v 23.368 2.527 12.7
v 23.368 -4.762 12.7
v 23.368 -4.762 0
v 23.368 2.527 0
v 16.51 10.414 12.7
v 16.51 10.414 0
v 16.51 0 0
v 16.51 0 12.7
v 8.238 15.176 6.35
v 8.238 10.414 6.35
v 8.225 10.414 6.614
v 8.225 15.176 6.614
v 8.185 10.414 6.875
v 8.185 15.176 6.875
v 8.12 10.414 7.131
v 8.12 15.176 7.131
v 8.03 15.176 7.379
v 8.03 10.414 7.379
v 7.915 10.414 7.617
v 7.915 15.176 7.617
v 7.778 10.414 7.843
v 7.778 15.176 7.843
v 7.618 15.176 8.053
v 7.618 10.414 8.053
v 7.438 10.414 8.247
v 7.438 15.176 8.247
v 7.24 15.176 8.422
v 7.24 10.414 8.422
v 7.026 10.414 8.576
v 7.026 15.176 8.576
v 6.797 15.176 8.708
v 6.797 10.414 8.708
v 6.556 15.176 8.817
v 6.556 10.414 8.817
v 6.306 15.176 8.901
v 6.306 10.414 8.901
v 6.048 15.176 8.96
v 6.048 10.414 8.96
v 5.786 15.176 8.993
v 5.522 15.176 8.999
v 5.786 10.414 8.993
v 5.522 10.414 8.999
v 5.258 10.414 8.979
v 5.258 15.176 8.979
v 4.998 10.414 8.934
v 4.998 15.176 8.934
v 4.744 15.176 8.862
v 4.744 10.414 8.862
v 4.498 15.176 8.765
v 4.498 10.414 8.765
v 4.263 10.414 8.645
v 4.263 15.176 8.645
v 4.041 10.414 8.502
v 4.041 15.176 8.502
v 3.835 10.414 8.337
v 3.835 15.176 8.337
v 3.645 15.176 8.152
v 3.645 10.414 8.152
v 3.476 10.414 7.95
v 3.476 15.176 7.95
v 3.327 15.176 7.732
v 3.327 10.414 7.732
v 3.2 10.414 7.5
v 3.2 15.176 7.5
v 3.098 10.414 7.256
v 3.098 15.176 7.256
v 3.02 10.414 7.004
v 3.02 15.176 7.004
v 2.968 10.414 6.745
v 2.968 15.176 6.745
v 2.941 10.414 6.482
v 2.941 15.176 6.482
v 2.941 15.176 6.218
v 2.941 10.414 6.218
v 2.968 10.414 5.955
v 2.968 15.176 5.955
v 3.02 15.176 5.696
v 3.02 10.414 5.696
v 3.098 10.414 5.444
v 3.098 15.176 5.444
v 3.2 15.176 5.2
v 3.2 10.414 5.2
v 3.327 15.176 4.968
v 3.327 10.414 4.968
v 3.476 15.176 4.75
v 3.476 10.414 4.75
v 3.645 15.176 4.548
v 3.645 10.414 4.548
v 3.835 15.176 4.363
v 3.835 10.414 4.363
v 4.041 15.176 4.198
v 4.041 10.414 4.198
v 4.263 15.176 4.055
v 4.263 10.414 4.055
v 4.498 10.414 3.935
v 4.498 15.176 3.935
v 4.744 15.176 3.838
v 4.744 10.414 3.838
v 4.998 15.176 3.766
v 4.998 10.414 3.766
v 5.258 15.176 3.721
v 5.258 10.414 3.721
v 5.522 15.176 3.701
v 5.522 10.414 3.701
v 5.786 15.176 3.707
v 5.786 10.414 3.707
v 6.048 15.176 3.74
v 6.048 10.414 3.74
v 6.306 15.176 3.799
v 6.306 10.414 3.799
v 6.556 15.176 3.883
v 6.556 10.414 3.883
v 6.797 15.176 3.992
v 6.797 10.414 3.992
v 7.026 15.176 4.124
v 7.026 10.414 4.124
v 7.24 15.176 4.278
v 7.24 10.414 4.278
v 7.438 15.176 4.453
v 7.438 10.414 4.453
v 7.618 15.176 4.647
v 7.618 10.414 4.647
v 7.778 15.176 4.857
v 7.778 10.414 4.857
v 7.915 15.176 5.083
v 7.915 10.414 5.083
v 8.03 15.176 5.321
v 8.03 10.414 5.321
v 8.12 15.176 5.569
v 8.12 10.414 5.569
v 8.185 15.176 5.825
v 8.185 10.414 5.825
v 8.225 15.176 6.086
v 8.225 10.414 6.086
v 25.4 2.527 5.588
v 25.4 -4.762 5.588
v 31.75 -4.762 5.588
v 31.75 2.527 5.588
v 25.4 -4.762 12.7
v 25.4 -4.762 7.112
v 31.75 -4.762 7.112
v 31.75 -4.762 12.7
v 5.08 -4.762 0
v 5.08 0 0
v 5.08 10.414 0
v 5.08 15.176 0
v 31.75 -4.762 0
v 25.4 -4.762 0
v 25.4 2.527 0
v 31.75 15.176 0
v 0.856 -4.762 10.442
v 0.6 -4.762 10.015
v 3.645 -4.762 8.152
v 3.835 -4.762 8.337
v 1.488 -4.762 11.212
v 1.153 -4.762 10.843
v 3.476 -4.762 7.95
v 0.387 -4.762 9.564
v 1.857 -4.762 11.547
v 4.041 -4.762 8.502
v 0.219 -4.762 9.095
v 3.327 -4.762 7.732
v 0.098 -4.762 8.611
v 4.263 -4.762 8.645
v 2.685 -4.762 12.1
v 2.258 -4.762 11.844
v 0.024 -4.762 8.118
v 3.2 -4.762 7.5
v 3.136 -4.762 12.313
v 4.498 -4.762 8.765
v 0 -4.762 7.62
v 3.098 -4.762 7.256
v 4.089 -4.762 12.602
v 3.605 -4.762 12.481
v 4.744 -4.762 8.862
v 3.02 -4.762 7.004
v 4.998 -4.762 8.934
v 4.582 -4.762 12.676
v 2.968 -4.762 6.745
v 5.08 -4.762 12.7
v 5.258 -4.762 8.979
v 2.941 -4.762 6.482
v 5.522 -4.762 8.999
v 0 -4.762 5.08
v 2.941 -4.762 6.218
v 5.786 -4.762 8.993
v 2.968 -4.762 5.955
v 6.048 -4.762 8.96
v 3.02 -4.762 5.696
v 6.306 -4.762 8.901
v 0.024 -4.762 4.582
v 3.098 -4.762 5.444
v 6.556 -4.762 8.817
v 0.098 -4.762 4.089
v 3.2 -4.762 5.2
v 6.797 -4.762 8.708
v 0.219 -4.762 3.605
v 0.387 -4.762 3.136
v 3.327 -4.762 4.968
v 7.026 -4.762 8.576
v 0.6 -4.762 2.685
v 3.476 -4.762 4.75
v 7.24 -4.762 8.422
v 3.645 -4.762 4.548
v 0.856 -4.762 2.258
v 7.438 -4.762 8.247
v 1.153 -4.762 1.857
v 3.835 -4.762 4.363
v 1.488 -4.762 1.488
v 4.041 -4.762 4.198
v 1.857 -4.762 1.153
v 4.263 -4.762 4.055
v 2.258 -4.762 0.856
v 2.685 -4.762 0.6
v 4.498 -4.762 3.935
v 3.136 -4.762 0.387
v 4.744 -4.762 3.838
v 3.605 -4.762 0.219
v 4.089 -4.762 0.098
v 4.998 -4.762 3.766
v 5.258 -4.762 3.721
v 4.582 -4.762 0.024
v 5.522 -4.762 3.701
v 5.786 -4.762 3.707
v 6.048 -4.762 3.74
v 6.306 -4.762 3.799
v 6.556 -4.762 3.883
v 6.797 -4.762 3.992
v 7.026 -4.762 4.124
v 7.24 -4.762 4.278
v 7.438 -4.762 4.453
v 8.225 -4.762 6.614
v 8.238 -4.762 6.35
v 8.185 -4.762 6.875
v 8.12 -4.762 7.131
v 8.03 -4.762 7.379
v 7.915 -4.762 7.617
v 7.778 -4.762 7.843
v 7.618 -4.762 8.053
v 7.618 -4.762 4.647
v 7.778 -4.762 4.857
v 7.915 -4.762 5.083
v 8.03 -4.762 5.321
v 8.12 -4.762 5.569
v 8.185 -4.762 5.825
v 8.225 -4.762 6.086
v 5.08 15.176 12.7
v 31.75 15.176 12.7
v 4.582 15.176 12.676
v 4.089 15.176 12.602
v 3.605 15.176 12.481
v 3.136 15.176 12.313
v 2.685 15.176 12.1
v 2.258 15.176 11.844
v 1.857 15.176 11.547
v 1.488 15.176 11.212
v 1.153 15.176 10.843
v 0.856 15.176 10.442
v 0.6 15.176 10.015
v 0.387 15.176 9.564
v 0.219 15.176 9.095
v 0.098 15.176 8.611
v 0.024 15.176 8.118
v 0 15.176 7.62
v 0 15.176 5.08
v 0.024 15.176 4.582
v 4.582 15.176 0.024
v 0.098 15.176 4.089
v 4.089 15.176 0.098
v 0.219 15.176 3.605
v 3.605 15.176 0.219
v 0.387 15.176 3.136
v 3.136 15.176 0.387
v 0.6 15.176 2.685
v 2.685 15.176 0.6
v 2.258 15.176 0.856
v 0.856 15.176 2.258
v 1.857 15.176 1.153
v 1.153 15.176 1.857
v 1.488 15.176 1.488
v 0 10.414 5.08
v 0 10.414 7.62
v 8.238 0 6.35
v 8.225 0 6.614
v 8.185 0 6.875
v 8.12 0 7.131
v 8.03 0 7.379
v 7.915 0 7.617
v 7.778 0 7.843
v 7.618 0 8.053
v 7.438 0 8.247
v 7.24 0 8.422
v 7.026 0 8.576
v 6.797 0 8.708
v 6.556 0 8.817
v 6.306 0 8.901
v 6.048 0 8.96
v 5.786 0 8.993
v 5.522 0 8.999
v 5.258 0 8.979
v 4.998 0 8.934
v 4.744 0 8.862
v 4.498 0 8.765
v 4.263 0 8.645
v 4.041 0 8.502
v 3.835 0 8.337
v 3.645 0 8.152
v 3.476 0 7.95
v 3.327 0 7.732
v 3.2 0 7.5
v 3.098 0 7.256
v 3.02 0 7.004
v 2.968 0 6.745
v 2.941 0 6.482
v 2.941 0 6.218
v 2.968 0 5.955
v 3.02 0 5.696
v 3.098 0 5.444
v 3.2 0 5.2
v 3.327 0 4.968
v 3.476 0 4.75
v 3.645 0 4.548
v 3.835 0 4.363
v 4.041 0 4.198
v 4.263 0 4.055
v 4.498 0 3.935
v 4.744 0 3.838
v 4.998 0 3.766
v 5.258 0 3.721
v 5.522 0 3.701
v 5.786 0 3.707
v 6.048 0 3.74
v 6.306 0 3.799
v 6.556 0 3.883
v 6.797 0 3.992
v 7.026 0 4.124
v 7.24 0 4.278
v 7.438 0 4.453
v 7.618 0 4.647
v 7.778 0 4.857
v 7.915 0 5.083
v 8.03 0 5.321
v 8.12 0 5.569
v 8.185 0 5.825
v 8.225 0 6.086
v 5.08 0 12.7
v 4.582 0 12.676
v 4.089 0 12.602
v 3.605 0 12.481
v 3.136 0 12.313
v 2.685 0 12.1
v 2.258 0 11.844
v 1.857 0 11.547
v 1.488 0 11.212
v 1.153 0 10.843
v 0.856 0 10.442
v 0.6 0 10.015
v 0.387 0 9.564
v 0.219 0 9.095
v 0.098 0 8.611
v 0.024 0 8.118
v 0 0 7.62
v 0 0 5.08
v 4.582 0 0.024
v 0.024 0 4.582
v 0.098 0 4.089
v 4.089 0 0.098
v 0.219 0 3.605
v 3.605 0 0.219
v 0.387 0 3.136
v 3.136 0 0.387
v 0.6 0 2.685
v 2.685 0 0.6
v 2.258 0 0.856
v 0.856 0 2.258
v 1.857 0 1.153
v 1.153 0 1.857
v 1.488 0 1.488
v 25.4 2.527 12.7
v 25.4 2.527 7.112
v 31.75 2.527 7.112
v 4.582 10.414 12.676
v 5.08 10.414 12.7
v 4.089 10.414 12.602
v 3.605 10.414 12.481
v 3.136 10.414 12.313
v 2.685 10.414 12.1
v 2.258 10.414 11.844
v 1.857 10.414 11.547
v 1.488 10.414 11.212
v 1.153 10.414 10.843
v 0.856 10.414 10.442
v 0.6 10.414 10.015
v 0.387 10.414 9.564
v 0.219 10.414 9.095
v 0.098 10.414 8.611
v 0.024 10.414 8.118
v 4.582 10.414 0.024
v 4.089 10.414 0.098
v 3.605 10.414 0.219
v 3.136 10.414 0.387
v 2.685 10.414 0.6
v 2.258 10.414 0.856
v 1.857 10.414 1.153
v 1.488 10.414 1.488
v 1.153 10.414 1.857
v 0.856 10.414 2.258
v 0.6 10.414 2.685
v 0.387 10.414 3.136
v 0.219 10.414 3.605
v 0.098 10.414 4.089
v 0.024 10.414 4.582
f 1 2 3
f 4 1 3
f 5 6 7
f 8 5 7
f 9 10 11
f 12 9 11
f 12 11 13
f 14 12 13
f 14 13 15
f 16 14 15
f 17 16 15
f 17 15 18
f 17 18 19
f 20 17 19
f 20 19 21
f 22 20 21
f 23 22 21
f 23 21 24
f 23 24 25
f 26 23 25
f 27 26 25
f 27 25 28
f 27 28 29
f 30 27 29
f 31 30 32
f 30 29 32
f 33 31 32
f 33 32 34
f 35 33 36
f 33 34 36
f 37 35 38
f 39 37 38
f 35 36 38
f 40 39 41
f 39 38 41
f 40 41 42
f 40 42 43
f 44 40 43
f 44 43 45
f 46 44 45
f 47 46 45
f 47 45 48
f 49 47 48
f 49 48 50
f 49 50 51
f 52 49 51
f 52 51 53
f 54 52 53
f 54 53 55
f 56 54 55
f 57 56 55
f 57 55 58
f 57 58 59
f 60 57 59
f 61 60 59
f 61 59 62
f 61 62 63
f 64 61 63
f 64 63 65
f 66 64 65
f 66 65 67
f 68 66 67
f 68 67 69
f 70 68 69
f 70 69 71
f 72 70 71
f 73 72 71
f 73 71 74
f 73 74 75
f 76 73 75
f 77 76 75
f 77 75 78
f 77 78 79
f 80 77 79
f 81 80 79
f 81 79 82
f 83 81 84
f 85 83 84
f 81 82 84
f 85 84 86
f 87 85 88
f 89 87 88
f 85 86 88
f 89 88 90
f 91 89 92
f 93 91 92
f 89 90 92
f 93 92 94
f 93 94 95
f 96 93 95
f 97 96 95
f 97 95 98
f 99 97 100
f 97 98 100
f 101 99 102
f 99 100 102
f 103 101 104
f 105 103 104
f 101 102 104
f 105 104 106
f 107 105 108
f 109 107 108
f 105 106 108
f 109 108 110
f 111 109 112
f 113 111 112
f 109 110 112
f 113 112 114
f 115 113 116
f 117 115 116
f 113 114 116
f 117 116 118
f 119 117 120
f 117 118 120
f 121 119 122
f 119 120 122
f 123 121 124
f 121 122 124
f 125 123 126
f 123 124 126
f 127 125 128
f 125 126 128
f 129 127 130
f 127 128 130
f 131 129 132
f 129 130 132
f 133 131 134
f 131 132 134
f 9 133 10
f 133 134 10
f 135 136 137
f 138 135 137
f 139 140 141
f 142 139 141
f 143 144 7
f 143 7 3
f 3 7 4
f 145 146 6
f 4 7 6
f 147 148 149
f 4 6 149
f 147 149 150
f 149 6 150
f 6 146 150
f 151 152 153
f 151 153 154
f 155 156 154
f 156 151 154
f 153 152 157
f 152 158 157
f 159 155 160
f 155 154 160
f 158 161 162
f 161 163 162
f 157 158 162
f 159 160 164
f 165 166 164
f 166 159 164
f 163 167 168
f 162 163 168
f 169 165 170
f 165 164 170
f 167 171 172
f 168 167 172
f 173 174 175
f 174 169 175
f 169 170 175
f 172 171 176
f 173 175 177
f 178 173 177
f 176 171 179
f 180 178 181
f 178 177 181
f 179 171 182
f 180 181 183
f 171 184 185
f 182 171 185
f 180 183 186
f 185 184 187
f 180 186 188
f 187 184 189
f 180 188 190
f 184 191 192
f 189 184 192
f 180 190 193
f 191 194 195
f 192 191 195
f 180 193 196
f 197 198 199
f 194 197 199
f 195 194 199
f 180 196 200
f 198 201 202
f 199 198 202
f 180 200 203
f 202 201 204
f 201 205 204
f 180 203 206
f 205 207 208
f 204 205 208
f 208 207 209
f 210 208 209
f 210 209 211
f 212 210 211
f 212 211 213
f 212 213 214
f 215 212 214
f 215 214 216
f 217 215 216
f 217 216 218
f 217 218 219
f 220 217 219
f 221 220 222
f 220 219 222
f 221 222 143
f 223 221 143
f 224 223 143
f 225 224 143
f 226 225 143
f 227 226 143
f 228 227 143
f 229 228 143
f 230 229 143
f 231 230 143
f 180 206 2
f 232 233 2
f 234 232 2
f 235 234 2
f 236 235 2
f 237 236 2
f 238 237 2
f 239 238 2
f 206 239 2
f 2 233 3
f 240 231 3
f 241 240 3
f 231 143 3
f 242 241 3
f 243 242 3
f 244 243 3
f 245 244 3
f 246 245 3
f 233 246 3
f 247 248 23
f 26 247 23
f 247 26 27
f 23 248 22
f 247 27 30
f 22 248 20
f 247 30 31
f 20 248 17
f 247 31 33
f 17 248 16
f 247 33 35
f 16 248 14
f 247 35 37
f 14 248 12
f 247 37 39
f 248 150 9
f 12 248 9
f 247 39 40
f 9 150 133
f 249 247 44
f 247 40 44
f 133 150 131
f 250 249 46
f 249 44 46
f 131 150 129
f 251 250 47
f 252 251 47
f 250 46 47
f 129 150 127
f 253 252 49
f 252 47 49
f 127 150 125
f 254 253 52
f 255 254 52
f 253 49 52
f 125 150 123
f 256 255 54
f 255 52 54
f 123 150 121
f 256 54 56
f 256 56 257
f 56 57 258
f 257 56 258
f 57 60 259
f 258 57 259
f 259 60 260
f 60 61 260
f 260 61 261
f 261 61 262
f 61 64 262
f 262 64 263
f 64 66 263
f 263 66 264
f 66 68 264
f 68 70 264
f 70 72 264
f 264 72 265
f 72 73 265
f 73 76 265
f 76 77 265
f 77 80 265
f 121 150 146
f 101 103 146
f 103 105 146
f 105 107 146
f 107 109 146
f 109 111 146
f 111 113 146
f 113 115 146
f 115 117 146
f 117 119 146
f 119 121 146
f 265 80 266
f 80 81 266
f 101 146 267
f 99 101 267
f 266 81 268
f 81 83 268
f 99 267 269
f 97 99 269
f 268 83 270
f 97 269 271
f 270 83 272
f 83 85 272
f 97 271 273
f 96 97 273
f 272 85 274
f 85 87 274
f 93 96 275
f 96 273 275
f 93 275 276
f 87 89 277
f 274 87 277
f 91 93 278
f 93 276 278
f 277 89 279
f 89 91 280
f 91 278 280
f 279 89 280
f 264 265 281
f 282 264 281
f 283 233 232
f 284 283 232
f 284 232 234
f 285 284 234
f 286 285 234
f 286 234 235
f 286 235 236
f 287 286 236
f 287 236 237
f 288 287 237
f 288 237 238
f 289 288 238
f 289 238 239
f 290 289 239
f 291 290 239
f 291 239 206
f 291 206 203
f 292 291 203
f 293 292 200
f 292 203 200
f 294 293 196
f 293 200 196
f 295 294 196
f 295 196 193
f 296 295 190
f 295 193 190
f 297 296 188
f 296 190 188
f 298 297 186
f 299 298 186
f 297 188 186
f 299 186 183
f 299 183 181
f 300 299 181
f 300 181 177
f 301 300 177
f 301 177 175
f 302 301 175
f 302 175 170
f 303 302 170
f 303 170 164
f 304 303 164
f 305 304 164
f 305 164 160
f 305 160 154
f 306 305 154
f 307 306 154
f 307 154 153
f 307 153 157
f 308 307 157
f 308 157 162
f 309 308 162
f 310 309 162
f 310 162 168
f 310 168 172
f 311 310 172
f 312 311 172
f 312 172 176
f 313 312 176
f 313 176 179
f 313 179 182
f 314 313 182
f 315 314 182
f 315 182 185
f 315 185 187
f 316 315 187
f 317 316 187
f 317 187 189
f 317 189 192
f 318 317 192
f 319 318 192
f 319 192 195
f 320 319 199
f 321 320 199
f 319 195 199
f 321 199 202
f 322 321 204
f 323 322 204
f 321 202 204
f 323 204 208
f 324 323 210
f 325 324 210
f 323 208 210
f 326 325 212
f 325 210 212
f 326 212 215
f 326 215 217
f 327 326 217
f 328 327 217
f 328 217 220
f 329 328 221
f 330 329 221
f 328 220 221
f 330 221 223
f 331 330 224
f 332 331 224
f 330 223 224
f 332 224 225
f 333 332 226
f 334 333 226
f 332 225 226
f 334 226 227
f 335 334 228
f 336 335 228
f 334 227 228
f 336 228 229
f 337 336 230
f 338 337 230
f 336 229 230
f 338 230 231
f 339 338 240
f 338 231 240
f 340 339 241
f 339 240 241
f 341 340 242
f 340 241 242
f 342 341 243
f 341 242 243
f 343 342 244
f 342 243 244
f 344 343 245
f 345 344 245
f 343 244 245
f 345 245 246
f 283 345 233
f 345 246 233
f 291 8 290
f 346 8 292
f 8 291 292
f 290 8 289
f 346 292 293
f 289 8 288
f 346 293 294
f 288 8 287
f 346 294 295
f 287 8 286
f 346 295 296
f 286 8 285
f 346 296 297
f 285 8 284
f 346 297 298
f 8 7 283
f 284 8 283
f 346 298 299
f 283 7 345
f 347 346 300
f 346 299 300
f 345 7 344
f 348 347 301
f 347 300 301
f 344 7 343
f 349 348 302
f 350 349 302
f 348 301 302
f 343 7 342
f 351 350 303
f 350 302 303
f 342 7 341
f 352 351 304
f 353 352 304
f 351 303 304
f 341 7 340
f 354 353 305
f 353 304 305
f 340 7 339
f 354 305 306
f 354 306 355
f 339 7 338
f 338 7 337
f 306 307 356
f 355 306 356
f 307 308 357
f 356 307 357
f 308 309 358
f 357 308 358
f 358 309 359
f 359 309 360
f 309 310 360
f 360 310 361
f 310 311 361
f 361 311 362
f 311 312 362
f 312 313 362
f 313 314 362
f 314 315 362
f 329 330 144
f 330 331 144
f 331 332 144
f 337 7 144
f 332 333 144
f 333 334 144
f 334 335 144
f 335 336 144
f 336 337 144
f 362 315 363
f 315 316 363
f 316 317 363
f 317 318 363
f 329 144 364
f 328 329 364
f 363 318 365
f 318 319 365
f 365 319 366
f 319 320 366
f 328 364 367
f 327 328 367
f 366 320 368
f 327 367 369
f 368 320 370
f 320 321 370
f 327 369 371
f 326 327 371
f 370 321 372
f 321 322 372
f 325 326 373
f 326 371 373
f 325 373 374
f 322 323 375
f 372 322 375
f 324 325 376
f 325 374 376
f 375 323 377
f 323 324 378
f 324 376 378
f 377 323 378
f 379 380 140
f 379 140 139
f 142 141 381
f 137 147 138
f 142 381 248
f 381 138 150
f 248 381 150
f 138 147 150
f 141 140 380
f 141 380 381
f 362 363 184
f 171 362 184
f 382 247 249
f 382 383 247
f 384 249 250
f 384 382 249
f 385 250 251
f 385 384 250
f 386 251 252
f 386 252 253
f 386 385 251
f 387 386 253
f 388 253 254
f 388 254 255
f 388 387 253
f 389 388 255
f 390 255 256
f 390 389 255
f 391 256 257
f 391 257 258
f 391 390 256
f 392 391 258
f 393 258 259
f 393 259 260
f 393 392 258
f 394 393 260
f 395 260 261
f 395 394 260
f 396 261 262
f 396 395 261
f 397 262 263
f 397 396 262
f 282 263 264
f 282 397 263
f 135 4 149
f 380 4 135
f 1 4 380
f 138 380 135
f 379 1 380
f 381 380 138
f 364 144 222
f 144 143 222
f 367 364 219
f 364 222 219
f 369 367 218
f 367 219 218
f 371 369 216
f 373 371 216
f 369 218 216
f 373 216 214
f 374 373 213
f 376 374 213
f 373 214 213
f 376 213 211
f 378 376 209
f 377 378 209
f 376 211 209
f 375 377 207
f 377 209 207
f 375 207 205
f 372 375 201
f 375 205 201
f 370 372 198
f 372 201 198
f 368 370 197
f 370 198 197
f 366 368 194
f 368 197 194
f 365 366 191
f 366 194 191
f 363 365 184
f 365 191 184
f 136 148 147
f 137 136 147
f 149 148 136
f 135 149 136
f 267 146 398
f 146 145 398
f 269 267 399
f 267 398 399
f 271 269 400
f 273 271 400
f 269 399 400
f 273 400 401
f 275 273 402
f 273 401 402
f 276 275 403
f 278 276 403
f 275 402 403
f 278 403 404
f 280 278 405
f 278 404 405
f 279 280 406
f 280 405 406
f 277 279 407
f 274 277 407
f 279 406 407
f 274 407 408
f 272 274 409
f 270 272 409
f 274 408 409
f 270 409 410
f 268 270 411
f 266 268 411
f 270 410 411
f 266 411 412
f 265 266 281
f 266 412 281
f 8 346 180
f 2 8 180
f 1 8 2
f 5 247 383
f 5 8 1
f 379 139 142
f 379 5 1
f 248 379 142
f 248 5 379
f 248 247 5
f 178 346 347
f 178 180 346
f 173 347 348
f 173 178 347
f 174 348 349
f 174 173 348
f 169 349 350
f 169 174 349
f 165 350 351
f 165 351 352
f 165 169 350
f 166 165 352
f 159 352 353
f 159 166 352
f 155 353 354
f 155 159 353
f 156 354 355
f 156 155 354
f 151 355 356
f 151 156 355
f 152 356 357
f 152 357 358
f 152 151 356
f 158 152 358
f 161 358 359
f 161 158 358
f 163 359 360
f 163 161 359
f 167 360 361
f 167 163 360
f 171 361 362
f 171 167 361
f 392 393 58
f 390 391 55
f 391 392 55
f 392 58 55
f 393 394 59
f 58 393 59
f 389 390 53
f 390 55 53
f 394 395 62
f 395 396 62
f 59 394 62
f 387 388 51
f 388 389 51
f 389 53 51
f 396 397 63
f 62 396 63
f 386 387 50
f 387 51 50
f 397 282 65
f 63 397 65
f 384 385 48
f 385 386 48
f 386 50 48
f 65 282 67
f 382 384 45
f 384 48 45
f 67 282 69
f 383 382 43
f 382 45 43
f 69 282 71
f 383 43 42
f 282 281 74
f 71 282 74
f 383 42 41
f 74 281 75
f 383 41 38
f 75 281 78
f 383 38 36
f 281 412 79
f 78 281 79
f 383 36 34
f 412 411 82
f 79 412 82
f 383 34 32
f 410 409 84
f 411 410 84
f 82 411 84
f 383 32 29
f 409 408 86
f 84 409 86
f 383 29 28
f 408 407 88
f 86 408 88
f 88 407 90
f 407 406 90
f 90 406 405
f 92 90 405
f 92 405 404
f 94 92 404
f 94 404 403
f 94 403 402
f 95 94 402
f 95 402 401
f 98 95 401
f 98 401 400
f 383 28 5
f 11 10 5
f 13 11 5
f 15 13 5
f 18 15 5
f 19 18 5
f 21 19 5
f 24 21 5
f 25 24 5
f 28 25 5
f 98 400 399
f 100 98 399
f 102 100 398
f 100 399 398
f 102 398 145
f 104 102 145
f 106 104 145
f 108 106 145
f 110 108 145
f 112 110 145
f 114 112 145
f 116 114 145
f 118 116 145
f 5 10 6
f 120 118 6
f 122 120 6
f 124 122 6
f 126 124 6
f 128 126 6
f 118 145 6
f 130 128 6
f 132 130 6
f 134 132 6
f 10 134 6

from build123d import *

# Parameters (mm, degrees)
F1_DEPTH = 12.7
F2_R     = 2.65
F3_DEPTH = 51.816
F4_R     = 5.08
F5_W     = 6.35
F5_H     = 1.524
F6_DEPTH = 7.2898


with BuildPart() as f1:
    # F0 (on Top) → F1 (new body)
    with BuildSketch(Plane.XY):
        Polygon((16.51, 0), (0, 0), (0, -4.7625), (25.4, -4.7625), (31.75, -4.7625), (31.75, 15.1765), (0, 15.1765), (0, 10.414), (16.51, 10.414), align=None)
    extrude(amount=F1_DEPTH)

    # F2 (on face) → F3 (cut)
    with BuildSketch(Plane.XZ.offset(4.7625)):
        with Locations((5.588, 6.35)):
            Circle(F2_R)
    extrude(amount=-F3_DEPTH, mode=Mode.SUBTRACT)

    # F4
    f4_edges = [f1.edges().sort_by_distance(p)[0] for p in [
        (0, -2.38125, 12.7),
        (0, 12.79525, 12.7),
        (0, -2.38125, 0),
        (0, 12.79525, 0),
    ]]
    fillet(f4_edges, radius=F4_R)

    # F5 (on face) → F6 (cut)
    with BuildSketch(Plane.XZ.offset(4.7625)):
        Polygon((25.4, 7.112), (25.4, 14.78833), (23.368, 14.78833), (23.368, -2.12807), (25.4, -2.12807), (25.4, 5.588), align=None)
        with Locations((28.575, 6.35)):
            Rectangle(F5_W, F5_H)
    extrude(amount=-F6_DEPTH, mode=Mode.SUBTRACT)


solid = f1.part
